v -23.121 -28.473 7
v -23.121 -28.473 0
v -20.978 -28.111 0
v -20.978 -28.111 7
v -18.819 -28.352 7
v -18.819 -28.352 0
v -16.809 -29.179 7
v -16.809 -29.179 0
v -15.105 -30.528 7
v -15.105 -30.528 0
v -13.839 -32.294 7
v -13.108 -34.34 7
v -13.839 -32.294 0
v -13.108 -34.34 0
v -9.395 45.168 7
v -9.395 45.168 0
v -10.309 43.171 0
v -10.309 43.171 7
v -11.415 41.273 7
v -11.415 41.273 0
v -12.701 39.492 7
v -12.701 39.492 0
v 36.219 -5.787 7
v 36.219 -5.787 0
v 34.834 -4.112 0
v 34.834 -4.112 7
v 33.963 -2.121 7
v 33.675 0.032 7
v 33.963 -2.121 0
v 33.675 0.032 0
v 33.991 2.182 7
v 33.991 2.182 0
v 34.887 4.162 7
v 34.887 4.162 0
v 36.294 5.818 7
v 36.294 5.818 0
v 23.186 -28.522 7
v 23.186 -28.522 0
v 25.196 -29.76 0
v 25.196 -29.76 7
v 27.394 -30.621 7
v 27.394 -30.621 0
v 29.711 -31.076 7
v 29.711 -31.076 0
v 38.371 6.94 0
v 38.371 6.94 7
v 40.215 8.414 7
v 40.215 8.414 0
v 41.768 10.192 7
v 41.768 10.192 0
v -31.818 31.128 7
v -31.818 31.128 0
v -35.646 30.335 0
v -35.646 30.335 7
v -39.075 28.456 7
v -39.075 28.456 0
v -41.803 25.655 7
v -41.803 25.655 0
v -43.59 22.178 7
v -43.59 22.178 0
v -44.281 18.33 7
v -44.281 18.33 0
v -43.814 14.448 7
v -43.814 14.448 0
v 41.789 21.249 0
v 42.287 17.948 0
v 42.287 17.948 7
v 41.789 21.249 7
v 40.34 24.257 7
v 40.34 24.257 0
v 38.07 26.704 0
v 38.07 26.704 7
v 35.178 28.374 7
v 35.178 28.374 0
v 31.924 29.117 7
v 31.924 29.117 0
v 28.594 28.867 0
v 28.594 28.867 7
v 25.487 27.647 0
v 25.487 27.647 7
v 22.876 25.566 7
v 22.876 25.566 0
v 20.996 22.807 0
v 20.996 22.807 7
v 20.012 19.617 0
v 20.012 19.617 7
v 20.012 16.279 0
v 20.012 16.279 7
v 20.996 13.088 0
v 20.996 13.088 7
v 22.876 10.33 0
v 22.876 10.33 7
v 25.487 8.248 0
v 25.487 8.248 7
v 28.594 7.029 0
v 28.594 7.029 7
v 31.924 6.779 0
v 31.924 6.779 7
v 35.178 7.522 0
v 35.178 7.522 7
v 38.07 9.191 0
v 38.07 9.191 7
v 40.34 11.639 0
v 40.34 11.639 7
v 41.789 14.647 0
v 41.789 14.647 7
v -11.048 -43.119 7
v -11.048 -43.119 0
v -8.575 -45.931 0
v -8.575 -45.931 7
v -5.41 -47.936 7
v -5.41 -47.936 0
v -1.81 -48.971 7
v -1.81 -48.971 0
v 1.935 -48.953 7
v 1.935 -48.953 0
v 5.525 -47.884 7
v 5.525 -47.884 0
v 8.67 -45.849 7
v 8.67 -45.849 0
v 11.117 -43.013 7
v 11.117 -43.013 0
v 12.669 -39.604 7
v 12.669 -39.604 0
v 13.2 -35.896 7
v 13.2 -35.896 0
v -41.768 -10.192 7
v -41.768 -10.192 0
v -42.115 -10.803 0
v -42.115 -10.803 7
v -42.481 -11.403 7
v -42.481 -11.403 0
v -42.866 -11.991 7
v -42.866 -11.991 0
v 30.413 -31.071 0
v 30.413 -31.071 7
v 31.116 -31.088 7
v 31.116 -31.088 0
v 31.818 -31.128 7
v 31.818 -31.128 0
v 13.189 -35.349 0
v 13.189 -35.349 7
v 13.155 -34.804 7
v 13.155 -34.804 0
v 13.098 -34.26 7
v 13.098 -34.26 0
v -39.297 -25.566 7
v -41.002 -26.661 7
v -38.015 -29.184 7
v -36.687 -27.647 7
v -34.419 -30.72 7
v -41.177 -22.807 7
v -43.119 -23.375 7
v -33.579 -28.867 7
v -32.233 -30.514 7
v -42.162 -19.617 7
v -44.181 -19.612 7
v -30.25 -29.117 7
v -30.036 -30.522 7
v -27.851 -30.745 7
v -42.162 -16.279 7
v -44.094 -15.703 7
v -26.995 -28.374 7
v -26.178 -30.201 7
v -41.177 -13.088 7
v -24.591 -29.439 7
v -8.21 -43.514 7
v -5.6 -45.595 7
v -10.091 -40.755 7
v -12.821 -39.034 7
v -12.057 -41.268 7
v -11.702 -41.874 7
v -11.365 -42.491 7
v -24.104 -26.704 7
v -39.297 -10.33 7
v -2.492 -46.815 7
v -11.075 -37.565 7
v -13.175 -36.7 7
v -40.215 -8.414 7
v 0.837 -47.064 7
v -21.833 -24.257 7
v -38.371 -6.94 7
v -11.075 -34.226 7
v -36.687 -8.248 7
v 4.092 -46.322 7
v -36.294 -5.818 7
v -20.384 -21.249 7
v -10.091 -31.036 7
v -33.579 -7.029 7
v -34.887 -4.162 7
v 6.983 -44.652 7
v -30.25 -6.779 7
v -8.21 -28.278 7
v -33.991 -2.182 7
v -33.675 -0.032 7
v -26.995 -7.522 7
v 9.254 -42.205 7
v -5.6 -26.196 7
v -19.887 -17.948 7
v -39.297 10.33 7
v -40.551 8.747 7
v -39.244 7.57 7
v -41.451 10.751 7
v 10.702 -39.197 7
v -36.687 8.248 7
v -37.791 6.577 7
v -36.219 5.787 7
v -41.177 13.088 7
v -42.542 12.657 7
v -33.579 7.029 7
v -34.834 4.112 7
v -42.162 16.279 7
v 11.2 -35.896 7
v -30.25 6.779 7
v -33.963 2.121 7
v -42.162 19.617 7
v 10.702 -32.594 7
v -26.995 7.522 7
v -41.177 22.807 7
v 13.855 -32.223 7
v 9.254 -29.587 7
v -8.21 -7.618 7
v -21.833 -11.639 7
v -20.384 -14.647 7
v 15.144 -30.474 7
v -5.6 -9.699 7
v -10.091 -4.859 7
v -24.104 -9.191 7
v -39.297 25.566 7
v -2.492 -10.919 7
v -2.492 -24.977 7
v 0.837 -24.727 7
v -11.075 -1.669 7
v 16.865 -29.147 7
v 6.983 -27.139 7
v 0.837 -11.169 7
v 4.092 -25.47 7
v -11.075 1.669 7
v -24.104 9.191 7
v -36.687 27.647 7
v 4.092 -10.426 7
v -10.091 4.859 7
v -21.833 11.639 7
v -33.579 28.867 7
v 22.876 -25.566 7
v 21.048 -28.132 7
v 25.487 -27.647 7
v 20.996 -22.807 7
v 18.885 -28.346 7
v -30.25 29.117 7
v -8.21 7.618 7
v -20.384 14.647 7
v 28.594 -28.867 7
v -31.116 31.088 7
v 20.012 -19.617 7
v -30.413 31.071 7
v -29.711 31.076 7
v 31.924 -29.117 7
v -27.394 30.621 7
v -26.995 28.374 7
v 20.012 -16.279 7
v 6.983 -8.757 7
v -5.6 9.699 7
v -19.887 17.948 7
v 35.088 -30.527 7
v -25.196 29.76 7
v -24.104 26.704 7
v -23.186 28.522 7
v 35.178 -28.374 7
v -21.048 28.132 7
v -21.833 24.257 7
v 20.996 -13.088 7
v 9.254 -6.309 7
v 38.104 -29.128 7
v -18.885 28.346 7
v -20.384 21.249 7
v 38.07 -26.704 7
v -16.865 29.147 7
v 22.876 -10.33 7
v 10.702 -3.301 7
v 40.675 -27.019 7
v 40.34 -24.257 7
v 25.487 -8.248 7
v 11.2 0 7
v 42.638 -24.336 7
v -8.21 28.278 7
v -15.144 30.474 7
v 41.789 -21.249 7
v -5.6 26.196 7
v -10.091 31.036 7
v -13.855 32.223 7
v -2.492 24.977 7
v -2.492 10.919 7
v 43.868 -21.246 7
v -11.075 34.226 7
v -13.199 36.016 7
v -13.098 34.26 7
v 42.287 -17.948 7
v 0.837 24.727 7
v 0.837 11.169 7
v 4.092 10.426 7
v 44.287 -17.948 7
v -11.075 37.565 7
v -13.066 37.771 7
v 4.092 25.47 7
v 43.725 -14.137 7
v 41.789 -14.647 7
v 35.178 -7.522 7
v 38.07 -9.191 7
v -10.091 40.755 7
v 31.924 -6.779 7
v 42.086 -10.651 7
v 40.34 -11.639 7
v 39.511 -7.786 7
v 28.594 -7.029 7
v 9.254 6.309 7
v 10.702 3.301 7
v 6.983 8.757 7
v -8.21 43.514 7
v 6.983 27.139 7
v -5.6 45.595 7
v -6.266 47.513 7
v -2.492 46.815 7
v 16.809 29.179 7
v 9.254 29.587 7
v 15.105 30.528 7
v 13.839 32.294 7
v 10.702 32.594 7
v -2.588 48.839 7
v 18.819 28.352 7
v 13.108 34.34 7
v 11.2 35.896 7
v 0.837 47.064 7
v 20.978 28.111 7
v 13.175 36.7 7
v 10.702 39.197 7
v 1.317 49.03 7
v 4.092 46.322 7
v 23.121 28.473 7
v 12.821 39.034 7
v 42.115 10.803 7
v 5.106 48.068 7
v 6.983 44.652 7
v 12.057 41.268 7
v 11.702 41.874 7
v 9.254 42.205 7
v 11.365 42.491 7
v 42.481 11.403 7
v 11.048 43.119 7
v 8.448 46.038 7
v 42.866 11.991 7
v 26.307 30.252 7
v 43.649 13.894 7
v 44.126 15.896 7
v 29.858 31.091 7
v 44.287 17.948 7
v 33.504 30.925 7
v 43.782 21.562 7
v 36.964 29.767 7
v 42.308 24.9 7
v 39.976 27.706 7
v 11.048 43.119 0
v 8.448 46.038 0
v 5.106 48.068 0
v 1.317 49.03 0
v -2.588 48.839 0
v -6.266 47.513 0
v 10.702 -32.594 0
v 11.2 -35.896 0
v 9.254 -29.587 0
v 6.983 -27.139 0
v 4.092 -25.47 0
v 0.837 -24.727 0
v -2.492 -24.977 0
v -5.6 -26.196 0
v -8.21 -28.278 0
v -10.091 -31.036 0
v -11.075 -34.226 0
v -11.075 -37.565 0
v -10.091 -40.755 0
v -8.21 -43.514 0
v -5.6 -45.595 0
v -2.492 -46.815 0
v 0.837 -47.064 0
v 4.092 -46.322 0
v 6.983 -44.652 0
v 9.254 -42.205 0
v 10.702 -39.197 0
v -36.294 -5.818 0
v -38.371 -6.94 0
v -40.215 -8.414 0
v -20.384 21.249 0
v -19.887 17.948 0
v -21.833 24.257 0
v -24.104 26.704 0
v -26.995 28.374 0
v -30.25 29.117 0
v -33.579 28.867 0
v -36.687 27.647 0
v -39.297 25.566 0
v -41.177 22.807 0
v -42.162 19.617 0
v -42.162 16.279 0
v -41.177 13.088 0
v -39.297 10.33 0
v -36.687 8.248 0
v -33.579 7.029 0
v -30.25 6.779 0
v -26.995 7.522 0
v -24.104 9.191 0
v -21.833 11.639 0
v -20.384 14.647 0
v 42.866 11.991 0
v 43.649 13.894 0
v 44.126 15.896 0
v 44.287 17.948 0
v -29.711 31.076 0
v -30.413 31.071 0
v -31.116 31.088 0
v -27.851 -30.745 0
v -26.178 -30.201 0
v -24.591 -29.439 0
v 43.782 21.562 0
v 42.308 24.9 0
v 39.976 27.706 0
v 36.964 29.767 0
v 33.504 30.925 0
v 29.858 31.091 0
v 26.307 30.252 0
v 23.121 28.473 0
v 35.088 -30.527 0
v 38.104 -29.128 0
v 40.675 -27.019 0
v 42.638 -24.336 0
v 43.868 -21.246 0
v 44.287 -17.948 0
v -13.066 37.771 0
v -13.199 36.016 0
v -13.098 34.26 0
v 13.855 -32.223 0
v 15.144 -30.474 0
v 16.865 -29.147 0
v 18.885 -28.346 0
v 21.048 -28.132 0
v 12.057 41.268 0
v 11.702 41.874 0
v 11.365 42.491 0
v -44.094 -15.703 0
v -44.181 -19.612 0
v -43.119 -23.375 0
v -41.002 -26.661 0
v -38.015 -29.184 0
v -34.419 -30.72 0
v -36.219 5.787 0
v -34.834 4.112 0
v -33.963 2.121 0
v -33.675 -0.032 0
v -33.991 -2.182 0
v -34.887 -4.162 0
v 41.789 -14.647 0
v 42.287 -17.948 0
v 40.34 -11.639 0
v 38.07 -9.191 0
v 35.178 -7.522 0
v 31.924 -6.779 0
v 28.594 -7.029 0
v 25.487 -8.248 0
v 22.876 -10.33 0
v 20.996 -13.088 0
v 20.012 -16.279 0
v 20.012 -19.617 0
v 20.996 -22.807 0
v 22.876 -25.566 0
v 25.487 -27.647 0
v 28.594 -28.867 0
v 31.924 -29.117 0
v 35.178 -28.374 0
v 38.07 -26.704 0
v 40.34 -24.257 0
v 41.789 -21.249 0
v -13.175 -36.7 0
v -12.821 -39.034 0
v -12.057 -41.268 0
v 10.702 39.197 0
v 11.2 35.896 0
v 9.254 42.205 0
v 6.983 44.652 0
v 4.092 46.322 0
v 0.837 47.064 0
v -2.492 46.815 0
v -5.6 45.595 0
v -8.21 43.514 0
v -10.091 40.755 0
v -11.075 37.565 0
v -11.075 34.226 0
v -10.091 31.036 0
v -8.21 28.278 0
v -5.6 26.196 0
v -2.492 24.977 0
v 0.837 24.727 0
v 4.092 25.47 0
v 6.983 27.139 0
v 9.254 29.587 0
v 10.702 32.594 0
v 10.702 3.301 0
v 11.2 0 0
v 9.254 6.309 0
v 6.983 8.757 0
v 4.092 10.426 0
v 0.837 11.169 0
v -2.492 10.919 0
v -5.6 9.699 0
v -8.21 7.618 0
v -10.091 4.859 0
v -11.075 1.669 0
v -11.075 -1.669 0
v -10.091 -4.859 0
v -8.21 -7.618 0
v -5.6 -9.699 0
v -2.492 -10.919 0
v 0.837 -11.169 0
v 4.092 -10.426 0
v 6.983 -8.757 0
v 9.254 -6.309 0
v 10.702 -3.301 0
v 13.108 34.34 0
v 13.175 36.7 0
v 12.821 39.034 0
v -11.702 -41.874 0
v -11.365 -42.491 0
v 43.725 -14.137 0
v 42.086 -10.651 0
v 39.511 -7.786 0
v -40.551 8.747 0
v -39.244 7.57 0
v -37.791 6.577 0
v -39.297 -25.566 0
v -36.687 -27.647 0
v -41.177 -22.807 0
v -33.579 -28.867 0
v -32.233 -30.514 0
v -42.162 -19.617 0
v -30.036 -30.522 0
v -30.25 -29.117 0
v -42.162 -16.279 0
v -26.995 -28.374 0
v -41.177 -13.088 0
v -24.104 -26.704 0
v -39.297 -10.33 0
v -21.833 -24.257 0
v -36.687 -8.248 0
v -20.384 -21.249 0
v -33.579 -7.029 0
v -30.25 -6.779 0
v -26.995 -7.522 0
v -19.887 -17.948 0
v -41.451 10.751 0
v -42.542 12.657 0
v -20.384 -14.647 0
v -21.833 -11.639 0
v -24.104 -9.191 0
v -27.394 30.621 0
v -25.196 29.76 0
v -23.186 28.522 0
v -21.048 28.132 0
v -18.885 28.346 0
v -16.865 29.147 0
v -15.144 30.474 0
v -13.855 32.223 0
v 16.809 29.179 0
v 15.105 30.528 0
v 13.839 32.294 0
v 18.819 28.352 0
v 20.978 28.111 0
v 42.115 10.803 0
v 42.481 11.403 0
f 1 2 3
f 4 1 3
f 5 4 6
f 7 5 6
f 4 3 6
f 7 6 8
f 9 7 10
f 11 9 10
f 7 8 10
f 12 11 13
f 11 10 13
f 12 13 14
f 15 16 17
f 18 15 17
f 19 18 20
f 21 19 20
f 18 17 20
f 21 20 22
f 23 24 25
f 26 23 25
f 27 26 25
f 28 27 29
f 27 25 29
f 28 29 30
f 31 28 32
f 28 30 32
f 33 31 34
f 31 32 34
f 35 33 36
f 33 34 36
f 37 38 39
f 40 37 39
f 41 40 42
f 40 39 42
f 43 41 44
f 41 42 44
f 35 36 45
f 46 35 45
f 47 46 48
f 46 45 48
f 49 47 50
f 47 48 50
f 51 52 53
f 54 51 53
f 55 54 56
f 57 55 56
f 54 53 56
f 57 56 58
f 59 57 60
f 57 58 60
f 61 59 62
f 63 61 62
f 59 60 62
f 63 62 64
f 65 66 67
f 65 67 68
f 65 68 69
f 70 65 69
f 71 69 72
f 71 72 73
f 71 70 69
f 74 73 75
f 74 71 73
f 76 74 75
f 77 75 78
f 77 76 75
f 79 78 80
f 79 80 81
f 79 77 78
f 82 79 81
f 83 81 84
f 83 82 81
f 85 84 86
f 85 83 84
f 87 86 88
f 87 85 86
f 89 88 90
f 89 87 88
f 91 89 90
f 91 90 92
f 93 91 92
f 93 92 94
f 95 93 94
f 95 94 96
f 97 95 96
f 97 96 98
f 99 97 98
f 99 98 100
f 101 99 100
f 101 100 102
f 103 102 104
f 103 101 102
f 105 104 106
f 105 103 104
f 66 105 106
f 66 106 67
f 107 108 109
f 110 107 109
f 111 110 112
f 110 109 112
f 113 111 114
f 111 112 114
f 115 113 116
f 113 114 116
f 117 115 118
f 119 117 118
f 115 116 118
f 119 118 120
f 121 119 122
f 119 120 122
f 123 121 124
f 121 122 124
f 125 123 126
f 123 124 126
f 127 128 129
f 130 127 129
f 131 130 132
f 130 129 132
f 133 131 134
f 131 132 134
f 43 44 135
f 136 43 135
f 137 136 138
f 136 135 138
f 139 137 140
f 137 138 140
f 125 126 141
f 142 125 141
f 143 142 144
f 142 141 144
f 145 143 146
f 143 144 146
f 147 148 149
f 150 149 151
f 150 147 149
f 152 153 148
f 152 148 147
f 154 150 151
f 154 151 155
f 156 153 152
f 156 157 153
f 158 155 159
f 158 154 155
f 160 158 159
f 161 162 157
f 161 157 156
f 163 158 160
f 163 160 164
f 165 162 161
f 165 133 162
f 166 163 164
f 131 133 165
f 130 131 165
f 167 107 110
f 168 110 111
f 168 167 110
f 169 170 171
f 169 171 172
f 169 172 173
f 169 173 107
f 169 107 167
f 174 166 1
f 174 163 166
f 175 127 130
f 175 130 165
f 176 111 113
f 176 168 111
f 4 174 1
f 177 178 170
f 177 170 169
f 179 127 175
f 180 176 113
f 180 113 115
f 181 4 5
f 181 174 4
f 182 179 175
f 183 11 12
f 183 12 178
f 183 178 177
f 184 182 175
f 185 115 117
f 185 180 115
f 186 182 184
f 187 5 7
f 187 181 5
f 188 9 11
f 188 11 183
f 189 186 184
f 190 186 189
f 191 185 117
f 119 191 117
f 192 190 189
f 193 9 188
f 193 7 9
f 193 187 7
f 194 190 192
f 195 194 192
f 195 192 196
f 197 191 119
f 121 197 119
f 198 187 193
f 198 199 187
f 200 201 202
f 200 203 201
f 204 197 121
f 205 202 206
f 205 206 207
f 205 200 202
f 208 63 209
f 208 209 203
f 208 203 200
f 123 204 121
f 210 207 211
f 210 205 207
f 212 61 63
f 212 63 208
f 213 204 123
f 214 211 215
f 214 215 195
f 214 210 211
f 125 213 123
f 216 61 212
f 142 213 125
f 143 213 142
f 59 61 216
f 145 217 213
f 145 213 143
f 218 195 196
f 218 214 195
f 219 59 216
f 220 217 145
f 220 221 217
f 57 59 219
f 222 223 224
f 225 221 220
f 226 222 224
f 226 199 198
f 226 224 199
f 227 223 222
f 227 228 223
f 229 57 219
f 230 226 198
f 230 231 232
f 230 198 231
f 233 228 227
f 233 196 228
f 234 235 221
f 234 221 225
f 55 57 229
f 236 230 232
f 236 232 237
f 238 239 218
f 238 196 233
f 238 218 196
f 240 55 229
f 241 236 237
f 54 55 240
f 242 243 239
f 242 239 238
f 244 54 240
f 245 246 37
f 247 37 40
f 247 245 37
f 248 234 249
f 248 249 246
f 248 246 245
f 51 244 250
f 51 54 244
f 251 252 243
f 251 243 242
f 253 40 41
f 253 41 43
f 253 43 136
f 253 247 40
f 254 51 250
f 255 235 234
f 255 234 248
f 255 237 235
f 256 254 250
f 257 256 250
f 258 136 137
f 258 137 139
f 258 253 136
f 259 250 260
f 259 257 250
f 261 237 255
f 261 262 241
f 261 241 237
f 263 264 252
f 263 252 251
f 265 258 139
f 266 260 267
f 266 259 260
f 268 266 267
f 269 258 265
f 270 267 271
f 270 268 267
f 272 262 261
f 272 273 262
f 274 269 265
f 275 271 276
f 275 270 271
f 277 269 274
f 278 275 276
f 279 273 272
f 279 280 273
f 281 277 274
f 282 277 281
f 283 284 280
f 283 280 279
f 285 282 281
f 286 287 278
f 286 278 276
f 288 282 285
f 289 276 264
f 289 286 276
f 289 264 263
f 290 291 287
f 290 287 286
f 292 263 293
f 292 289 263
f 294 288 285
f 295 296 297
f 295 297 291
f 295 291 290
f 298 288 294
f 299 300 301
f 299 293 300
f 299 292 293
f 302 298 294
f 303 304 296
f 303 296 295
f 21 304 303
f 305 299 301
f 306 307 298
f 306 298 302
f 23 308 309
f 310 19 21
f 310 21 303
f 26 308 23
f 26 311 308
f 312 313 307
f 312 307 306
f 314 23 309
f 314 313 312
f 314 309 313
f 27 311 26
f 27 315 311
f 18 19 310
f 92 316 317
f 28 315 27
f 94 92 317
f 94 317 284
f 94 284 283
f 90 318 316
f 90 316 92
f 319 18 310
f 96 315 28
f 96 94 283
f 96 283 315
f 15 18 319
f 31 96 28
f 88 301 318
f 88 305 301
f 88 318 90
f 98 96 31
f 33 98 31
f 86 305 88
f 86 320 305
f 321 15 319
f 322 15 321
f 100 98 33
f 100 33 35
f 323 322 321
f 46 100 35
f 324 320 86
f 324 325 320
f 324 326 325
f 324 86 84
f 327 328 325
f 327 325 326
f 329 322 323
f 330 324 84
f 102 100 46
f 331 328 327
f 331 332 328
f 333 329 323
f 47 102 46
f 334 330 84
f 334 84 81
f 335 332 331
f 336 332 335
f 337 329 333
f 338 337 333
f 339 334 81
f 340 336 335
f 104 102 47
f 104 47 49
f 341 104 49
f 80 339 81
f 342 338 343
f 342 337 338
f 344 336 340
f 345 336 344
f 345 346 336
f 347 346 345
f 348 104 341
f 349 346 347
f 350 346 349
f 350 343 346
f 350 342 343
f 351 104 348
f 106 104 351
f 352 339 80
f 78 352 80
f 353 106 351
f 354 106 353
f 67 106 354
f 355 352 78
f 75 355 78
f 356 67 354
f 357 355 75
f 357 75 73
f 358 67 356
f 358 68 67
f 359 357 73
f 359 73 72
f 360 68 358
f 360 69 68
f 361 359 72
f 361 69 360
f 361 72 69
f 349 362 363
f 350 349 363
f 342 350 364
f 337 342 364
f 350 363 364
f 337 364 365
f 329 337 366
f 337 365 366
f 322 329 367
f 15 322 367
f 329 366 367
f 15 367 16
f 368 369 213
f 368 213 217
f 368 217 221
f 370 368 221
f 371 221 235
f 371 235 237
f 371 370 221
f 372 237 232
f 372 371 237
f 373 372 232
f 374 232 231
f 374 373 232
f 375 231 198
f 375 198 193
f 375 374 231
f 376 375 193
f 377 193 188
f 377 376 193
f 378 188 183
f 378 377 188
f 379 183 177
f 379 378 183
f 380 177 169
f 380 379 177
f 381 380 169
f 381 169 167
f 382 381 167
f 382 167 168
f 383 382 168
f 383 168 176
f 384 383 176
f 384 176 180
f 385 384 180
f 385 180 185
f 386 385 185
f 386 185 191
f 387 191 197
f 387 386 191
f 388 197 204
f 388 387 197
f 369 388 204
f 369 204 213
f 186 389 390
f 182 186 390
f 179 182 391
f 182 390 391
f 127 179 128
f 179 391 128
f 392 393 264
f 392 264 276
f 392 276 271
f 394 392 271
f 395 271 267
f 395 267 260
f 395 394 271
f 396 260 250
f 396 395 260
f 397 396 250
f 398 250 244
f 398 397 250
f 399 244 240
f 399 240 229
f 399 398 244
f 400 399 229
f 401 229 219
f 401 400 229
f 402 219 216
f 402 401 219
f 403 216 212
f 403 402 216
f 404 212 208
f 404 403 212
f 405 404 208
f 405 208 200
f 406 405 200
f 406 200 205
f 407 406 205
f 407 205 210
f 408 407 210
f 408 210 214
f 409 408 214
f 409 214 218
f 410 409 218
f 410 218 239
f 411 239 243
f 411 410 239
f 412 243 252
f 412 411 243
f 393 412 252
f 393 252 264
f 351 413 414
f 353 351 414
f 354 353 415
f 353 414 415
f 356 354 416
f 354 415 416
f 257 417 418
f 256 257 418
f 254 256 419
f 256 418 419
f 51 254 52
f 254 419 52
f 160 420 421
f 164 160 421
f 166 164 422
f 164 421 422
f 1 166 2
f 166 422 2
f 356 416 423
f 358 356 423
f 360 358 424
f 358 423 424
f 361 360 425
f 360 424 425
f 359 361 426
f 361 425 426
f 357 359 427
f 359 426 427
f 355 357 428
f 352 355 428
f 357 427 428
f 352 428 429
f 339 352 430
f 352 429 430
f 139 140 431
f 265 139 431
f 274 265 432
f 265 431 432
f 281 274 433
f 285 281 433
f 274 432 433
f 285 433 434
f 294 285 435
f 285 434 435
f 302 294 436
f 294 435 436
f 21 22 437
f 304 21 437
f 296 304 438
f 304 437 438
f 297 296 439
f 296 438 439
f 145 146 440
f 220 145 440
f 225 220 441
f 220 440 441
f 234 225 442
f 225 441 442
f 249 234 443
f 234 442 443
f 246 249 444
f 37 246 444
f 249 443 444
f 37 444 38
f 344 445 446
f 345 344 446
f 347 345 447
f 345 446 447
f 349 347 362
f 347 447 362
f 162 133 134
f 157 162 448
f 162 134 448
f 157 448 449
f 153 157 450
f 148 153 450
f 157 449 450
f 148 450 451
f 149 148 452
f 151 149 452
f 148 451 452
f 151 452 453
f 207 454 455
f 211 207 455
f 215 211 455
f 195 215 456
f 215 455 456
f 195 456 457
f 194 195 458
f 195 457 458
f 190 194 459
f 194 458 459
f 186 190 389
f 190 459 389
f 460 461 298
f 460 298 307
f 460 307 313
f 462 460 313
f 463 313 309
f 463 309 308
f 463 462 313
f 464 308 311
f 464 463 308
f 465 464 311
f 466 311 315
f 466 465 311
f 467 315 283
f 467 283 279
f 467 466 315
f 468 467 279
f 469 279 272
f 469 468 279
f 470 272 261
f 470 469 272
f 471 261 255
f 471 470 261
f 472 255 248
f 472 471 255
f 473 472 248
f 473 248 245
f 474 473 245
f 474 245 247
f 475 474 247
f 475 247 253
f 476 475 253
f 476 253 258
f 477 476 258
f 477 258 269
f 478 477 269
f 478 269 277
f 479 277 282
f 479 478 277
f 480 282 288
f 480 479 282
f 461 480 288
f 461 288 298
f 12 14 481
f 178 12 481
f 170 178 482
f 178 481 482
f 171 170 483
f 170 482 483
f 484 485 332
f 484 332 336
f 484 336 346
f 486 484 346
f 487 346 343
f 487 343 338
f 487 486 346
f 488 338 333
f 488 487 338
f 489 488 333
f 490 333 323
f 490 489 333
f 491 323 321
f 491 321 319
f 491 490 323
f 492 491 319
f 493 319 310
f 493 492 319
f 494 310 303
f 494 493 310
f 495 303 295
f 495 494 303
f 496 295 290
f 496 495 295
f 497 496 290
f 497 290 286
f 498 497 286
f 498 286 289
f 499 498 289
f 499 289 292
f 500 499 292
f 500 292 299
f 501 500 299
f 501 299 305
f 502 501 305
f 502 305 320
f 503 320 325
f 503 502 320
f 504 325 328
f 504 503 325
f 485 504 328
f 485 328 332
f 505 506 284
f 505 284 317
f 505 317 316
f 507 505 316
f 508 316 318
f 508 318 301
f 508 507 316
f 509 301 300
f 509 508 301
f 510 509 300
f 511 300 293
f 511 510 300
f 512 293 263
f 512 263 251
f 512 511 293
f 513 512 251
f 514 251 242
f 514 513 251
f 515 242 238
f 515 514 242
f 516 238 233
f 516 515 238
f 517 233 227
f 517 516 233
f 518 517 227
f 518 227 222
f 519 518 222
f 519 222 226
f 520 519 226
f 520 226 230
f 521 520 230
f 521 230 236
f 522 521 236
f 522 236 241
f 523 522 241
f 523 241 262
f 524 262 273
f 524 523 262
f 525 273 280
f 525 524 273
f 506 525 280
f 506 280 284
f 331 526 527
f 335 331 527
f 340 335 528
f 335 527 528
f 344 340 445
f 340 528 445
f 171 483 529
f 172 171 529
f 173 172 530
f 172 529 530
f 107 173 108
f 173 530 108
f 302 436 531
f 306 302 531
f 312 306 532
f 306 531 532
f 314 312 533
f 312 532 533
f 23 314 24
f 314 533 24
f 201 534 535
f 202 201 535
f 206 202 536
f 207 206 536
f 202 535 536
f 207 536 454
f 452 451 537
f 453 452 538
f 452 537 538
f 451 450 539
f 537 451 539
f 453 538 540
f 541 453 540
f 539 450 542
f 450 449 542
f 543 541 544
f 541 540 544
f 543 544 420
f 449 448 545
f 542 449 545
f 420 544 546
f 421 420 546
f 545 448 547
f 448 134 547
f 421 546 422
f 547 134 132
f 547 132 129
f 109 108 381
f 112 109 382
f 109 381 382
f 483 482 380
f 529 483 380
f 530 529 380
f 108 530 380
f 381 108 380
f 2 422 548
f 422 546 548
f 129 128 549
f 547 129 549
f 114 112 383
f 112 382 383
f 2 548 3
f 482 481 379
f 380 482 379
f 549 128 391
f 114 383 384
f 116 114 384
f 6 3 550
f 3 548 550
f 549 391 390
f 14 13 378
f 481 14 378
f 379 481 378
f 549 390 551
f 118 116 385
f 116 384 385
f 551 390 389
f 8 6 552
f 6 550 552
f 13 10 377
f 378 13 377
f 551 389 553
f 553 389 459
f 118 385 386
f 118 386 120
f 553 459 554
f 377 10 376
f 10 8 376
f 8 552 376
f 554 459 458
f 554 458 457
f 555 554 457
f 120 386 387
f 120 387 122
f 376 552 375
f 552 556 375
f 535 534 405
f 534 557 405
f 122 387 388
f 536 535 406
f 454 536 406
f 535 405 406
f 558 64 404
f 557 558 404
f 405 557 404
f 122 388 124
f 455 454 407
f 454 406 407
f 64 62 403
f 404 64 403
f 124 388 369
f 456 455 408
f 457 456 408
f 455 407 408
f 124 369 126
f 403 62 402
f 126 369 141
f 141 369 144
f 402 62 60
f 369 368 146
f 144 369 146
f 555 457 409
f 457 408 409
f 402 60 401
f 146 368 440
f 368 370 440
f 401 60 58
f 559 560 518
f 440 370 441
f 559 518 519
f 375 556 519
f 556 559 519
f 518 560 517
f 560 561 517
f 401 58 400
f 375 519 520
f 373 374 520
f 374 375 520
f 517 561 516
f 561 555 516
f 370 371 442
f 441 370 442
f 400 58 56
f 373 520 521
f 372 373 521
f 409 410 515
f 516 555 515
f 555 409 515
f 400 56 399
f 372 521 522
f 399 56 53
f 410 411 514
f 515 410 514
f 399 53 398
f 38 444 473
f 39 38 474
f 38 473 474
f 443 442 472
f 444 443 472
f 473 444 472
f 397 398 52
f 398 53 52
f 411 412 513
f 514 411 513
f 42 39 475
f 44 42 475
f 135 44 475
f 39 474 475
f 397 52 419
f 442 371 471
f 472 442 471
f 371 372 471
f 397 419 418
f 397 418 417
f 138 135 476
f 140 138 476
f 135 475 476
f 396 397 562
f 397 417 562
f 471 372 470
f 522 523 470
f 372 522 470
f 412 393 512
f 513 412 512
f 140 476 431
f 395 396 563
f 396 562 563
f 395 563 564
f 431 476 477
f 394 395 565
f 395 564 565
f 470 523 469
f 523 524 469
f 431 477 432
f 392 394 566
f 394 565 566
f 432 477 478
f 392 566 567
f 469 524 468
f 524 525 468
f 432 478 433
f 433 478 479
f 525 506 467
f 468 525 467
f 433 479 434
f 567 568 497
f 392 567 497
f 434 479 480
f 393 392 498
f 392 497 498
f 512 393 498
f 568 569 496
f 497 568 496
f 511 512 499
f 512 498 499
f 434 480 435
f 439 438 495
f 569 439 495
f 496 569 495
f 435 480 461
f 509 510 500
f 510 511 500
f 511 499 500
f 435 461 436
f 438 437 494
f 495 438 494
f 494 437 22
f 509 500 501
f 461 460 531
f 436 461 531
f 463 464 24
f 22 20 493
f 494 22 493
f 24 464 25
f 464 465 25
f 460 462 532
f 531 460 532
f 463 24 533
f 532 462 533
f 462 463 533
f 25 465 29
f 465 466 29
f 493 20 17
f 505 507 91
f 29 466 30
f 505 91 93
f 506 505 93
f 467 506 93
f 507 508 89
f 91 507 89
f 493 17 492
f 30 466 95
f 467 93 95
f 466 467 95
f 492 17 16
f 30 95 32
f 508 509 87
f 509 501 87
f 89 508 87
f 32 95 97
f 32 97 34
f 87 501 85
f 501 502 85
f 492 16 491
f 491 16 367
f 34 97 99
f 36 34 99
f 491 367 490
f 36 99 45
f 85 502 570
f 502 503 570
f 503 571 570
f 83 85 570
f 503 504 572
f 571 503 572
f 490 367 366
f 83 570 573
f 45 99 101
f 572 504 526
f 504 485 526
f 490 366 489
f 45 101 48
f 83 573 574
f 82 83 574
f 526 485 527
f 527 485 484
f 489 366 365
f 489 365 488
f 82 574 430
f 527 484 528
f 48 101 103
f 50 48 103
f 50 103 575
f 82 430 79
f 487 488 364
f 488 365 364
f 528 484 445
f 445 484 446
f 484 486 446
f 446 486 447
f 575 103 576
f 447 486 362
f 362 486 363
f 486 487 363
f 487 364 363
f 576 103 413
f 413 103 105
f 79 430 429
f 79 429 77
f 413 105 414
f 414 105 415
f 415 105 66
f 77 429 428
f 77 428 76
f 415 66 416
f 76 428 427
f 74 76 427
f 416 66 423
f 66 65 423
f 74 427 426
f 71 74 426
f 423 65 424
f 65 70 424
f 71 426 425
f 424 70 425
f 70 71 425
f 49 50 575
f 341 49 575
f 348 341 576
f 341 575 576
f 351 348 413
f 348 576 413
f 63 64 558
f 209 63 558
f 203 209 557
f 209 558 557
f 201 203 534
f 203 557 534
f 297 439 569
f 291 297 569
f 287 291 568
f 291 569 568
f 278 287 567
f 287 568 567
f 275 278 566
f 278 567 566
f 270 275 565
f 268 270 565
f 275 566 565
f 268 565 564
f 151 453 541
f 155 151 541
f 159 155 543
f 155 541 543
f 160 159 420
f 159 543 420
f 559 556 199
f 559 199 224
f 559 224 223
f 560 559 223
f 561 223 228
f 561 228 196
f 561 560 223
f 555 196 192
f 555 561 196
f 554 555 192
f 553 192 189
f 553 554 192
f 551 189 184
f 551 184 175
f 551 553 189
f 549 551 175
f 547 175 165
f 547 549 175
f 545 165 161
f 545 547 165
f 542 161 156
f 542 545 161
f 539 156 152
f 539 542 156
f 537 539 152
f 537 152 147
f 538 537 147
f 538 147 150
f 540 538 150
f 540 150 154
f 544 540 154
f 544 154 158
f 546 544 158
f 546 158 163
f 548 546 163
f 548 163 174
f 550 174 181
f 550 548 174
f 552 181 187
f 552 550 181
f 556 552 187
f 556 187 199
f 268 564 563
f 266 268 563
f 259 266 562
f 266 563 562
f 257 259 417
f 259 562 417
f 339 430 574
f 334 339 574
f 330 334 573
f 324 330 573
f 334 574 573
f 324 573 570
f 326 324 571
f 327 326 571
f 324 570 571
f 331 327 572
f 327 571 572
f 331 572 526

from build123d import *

# Parameters (mm, degrees)
F0_R     = 11.2
F0_R_2   = 13.2
F1_DEPTH = 7


with BuildPart() as f1:
    # F0 (on Top) → F1 (new body)
    with BuildSketch(Plane.XY):
        with BuildLine():
            ThreePointArc((-36.21903, 5.78652), (-19.634866, 11.382994), (-23.185572, 28.522057))
            ThreePointArc((-23.185572, 28.522057), (-26.275542, 30.239878), (-29.710626, 31.075951))
            ThreePointArc((-29.710626, 31.075951), (-30.764801, 31.077003), (-31.817763, 31.127599))
            ThreePointArc((-31.817763, 31.127599), (-41.802797, 25.655223), (-43.814174, 14.447985))
            ThreePointArc((-43.814174, 14.447985), (-41.972925, 11.717586), (-40.55145, 8.746949))
            ThreePointArc((-40.55145, 8.746949), (-38.533827, 7.049286), (-36.21903, 5.78652))
        make_face()
        with Locations((-31.086612, 17.947864)):
            Circle(F0_R, mode=Mode.SUBTRACT)
        with BuildLine():
            ThreePointArc((-9.394765, 45.168181), (-10.838735, 42.208413), (-12.700645, 39.492061))
            ThreePointArc((-12.700645, 39.492061), (-13.162052, 36.895916), (-13.098242, 34.25986))
            ThreePointArc((-13.098242, 34.25986), (0.040529, 22.69579), (13.10804, 34.340323))
            ThreePointArc((13.10804, 34.340323), (13.050731, 37.875226), (12.05725, 41.268132))
            ThreePointArc((12.05725, 41.268132), (11.531073, 42.181601), (11.04841, 43.11879))
            ThreePointArc((11.04841, 43.11879), (1.316676, 49.029895), (-9.394765, 45.168181))
        make_face()
        with Locations((0, 35.895728)):
            Circle(F0_R, mode=Mode.SUBTRACT)
        with BuildLine():
            ThreePointArc((44.286612, 17.947864), (36.964159, 29.767104), (23.120788, 28.47334))
            ThreePointArc((23.120788, 28.47334), (19.675395, 11.312796), (36.293612, 5.818266))
            ThreePointArc((36.293612, 5.818266), (39.326273, 7.635348), (41.767875, 10.192181))
            ThreePointArc((41.767875, 10.192181), (42.295874, 11.104598), (42.866173, 11.991191))
            ThreePointArc((42.866173, 11.991191), (43.926593, 14.886018), (44.286612, 17.947864))
        make_face()
        with Locations((31.086612, 17.947864)):
            Circle(F0_R, mode=Mode.SUBTRACT)
        with BuildLine():
            ThreePointArc((13.10804, 34.340323), (0.040529, 22.69579), (-13.098242, 34.25986))
            ThreePointArc((-13.098242, 34.25986), (-16.865441, 29.14687), (-23.185572, 28.522057))
            ThreePointArc((-23.185572, 28.522057), (-19.634866, 11.382994), (-36.21903, 5.78652))
            ThreePointArc((-36.21903, 5.78652), (-33.67465, -0.032465), (-36.293612, -5.818266))
            ThreePointArc((-36.293612, -5.818266), (-19.675395, -11.312796), (-23.120788, -28.47334))
            ThreePointArc((-23.120788, -28.47334), (-16.80921, -29.179335), (-13.10804, -34.340323))
            ThreePointArc((-13.10804, -34.340323), (-0.040529, -22.69579), (13.098242, -34.25986))
            ThreePointArc((13.098242, -34.25986), (16.865441, -29.14687), (23.185572, -28.522057))
            ThreePointArc((23.185572, -28.522057), (19.634866, -11.382994), (36.21903, -5.78652))
            ThreePointArc((36.21903, -5.78652), (33.67465, 0.032465), (36.293612, 5.818266))
            ThreePointArc((36.293612, 5.818266), (19.675395, 11.312796), (23.120788, 28.47334))
            ThreePointArc((23.120788, 28.47334), (16.80921, 29.179335), (13.10804, 34.340323))
        make_face()
        Circle(F0_R_2, mode=Mode.SUBTRACT)
        with BuildLine():
            ThreePointArc((44.286612, -17.947864), (42.086337, -10.650875), (36.21903, -5.78652))
            ThreePointArc((36.21903, -5.78652), (19.634866, -11.382994), (23.185572, -28.522057))
            ThreePointArc((23.185572, -28.522057), (26.275542, -30.239878), (29.710626, -31.075951))
            ThreePointArc((29.710626, -31.075951), (30.764801, -31.077003), (31.817763, -31.127599))
            ThreePointArc((31.817763, -31.127599), (40.675438, -27.01949), (44.286612, -17.947864))
        make_face()
        with Locations((31.086612, -17.947864)):
            Circle(F0_R, mode=Mode.SUBTRACT)
        with BuildLine():
            ThreePointArc((13.098242, -34.25986), (-0.040529, -22.69579), (-13.10804, -34.340323))
            ThreePointArc((-13.10804, -34.340323), (-13.050731, -37.875226), (-12.05725, -41.268132))
            ThreePointArc((-12.05725, -41.268132), (-11.531073, -42.181601), (-11.04841, -43.11879))
            ThreePointArc((-11.04841, -43.11879), (3.768354, -48.5464), (13.2, -35.895728))
            ThreePointArc((13.2, -35.895728), (13.174536, -35.076213), (13.098242, -34.25986))
        make_face()
        with Locations((0, -35.895728)):
            Circle(F0_R, mode=Mode.SUBTRACT)
        with BuildLine():
            ThreePointArc((-23.120788, -28.47334), (-19.675395, -11.312796), (-36.293612, -5.818266))
            ThreePointArc((-36.293612, -5.818266), (-39.326273, -7.635348), (-41.767875, -10.192181))
            ThreePointArc((-41.767875, -10.192181), (-42.295874, -11.104598), (-42.866173, -11.991191))
            ThreePointArc((-42.866173, -11.991191), (-43.119473, -23.374673), (-34.419409, -30.720196))
            ThreePointArc((-34.419409, -30.720196), (-31.13419, -30.490827), (-27.850805, -30.745112))
            ThreePointArc((-27.850805, -30.745112), (-25.371774, -29.84663), (-23.120788, -28.47334))
        make_face()
        with Locations((-31.086612, -17.947864)):
            Circle(F0_R, mode=Mode.SUBTRACT)
        Circle(F0_R_2)
        Circle(F0_R, mode=Mode.SUBTRACT)
    extrude(amount=F1_DEPTH)


solid = f1.part
